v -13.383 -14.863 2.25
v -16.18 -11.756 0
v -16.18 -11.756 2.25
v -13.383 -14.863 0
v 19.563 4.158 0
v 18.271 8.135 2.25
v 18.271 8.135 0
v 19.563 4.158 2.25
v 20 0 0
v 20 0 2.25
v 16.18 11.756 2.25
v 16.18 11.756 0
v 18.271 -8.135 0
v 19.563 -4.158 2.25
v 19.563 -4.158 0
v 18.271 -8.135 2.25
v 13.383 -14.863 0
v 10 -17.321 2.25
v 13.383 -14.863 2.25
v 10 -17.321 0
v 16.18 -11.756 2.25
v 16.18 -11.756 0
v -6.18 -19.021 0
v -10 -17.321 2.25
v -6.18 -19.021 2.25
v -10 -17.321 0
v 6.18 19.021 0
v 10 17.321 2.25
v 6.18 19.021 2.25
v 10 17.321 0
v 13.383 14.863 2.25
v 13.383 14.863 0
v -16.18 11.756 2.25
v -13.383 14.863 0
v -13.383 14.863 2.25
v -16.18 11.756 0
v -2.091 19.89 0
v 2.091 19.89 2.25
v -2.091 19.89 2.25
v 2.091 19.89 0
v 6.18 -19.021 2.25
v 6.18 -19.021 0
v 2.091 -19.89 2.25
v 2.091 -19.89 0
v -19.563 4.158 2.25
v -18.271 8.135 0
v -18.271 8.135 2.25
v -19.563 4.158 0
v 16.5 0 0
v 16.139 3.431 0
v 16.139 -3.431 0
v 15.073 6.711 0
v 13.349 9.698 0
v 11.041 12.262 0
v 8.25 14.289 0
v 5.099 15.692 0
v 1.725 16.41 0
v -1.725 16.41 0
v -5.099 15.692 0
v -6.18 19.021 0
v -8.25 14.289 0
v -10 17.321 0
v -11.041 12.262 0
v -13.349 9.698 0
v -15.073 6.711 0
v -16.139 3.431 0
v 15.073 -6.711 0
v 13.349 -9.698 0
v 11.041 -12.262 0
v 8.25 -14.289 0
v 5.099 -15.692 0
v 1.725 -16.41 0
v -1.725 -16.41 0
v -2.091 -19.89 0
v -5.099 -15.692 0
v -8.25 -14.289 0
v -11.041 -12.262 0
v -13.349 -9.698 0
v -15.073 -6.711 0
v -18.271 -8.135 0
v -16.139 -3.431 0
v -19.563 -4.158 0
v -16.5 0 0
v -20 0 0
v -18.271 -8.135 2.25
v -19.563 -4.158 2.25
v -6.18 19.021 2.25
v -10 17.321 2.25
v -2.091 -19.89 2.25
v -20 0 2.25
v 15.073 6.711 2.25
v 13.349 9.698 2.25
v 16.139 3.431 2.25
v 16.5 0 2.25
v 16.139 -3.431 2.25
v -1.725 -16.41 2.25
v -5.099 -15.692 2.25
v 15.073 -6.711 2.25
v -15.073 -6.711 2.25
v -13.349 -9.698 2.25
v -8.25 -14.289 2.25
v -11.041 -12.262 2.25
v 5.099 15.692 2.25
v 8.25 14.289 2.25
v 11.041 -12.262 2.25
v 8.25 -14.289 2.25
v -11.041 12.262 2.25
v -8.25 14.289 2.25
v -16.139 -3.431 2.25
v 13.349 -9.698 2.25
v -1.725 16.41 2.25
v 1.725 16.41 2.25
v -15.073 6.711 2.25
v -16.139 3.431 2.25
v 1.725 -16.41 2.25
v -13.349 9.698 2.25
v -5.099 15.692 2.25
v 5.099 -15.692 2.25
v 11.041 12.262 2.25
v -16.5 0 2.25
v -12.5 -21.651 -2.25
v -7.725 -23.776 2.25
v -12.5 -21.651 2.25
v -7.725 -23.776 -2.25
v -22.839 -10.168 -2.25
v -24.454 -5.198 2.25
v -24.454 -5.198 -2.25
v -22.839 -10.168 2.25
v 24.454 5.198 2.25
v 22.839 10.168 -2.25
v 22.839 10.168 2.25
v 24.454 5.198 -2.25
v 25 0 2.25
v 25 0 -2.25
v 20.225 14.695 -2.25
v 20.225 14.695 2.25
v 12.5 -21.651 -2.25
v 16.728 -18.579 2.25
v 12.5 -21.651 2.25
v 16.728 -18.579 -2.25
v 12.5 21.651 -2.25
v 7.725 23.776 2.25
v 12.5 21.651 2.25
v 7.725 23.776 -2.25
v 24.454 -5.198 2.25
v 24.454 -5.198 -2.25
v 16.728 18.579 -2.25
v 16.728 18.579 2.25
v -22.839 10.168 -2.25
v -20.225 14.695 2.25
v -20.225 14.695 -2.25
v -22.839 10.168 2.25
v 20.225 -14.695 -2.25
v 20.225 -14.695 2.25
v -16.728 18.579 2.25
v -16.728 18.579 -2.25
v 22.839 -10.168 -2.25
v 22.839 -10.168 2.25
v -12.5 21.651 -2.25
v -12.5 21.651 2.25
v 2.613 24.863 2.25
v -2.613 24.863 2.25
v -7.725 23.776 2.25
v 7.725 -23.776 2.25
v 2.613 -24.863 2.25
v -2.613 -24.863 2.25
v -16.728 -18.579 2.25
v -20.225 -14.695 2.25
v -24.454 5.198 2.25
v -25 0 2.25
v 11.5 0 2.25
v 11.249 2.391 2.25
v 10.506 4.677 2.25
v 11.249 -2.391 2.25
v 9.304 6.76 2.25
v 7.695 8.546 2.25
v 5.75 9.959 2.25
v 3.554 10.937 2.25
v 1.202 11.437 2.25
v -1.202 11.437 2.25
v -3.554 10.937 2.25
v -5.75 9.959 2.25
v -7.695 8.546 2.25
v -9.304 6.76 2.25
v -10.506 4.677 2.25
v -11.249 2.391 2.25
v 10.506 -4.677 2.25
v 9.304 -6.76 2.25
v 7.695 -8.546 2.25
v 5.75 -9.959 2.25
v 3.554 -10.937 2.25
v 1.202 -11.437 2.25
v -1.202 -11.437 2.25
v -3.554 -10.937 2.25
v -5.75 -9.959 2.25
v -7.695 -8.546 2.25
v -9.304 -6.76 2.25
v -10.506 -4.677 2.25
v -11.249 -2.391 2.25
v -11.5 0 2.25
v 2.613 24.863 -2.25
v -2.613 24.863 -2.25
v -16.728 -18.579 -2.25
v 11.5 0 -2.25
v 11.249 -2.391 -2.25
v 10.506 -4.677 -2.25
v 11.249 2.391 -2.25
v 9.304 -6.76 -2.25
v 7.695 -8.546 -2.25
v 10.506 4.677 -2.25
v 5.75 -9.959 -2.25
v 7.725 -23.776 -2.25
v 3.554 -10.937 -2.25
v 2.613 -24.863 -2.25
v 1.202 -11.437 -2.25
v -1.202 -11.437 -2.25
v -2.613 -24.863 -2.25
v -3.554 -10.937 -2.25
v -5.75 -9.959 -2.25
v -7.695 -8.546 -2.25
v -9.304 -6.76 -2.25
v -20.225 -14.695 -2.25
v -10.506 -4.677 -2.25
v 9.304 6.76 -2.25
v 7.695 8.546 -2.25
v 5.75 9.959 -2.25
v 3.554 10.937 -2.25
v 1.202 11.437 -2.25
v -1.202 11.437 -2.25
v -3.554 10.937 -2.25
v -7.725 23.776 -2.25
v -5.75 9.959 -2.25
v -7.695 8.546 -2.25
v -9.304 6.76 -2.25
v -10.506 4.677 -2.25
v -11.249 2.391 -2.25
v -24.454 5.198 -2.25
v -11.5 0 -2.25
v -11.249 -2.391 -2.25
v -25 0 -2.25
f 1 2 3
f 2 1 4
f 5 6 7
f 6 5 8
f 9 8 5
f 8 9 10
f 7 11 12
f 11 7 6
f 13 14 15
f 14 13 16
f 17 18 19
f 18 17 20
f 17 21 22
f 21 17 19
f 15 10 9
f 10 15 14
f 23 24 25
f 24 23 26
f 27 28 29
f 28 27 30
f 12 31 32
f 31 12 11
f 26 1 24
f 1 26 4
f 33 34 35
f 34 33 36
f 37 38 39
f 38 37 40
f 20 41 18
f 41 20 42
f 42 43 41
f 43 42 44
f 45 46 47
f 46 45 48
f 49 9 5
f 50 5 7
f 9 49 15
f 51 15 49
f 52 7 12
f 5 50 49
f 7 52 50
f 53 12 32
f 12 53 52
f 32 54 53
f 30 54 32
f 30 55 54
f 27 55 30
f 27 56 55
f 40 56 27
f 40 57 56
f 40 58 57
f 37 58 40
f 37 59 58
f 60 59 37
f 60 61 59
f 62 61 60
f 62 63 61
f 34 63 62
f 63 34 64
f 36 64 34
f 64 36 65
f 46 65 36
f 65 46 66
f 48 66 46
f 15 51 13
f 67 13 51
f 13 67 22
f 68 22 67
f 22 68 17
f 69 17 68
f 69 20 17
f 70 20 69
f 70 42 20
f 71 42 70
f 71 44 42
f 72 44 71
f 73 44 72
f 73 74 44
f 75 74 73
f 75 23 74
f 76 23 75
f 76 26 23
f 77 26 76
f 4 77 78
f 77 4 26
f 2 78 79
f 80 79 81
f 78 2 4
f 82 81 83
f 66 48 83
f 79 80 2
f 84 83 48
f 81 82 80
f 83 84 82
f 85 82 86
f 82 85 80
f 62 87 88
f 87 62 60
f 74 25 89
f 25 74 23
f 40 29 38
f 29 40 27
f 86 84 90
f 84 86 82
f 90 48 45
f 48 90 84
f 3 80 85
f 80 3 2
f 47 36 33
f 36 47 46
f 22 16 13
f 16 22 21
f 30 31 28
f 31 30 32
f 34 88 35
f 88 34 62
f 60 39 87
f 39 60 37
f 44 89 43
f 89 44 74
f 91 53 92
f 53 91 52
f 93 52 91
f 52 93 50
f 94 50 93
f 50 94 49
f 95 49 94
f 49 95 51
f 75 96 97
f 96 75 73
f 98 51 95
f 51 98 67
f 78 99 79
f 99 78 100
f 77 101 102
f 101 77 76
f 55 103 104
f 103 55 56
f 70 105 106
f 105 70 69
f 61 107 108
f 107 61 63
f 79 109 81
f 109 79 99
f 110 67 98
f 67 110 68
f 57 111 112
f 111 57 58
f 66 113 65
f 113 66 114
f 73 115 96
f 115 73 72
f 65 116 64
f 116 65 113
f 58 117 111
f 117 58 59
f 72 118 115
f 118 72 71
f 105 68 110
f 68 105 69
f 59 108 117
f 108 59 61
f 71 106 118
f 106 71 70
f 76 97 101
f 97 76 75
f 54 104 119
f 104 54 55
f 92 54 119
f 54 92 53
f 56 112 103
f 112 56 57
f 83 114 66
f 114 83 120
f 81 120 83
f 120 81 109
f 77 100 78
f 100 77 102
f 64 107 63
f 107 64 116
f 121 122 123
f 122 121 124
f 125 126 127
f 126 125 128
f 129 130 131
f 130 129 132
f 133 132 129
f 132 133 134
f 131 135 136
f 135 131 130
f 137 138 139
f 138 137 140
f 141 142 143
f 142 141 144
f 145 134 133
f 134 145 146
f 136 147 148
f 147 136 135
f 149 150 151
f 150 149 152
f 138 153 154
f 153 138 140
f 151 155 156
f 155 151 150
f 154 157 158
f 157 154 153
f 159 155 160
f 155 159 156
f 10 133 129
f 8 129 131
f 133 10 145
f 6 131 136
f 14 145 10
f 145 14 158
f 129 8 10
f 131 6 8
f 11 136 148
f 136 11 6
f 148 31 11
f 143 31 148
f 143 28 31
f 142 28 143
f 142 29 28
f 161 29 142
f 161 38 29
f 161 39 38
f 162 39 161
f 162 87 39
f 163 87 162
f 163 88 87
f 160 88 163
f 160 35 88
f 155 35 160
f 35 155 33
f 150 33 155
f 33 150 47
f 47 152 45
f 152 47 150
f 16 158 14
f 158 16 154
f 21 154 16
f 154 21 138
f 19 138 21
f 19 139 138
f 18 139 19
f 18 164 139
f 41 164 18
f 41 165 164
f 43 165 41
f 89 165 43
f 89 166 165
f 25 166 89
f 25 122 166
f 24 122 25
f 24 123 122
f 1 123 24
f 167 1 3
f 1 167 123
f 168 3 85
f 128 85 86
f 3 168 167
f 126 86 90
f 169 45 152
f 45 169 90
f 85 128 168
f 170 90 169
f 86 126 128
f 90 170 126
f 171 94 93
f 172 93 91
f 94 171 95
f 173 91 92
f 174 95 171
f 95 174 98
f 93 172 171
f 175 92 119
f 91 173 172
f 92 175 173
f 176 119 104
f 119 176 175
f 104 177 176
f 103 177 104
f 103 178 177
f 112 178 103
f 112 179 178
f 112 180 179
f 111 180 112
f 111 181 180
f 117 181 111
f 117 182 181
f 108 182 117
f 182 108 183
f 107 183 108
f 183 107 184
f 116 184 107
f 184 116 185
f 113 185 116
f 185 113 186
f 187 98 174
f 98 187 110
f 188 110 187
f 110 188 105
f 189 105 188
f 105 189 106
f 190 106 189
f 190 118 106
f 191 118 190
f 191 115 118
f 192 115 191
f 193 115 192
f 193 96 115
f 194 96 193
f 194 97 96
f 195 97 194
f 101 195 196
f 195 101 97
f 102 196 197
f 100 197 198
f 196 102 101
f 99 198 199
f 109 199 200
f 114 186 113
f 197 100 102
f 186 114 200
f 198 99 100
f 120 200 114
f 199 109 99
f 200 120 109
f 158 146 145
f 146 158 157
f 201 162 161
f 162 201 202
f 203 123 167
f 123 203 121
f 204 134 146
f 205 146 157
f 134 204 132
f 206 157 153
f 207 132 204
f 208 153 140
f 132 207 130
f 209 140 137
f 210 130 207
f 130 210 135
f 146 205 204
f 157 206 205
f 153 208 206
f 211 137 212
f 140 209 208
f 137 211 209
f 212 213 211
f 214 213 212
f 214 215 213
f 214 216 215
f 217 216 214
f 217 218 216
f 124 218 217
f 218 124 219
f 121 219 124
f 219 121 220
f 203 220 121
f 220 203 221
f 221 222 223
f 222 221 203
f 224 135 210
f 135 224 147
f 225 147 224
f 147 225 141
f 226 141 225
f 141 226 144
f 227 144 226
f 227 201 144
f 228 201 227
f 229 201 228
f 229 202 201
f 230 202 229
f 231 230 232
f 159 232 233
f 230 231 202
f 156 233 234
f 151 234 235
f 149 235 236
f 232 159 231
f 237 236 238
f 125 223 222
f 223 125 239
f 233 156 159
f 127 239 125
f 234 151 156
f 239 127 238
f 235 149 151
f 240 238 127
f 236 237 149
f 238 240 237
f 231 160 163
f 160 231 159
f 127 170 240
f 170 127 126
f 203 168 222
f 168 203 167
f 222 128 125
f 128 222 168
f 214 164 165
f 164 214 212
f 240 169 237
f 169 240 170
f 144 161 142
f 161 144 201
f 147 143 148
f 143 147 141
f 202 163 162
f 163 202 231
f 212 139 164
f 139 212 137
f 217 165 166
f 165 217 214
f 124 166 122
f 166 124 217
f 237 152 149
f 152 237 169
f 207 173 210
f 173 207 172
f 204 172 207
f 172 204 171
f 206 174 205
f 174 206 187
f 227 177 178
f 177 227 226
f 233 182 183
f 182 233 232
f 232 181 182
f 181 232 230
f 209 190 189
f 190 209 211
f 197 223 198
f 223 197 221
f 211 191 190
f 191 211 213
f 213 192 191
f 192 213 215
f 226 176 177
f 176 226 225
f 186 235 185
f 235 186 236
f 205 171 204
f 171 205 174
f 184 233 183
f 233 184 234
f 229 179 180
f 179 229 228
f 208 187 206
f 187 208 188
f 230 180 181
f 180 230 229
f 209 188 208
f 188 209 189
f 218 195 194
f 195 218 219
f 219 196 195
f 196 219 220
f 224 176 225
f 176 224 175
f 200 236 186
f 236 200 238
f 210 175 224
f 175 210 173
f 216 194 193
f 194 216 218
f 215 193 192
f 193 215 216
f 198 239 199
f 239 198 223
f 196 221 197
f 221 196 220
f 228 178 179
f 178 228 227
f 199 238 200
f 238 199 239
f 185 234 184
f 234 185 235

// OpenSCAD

						//DICHIARAZIONI:                     		// DECLARATIONS:

r1=16.5;    //diametro interno guarnizione					// inner diameter seal
r2=20 ;   //diametro esterno guarnizione					// ??outer diameter seal
s=2.5;      //spessore guarnizione						// thickness seal

						//IMPOSTAZIONI FUNZIONI					// FUNCTION SETTINGS

rs1=r1-5; //diametro interno supporto						// inner diameter support
rs2=r2+5; //diametro esterno supporto						// outer diameter support
ss=s+2;      //spessore supporto							// thickness support

						//GUARNIZIONE									// SEAL

difference()
{
cylinder(h=ss,r=rs2,center=true);
cylinder(h=ss+2,r=rs1,center=true);
difference()
{
cylinder(h=s,r=r2,center=true+1);
cylinder(h=s,r=r1,center=true+1);
}
}



